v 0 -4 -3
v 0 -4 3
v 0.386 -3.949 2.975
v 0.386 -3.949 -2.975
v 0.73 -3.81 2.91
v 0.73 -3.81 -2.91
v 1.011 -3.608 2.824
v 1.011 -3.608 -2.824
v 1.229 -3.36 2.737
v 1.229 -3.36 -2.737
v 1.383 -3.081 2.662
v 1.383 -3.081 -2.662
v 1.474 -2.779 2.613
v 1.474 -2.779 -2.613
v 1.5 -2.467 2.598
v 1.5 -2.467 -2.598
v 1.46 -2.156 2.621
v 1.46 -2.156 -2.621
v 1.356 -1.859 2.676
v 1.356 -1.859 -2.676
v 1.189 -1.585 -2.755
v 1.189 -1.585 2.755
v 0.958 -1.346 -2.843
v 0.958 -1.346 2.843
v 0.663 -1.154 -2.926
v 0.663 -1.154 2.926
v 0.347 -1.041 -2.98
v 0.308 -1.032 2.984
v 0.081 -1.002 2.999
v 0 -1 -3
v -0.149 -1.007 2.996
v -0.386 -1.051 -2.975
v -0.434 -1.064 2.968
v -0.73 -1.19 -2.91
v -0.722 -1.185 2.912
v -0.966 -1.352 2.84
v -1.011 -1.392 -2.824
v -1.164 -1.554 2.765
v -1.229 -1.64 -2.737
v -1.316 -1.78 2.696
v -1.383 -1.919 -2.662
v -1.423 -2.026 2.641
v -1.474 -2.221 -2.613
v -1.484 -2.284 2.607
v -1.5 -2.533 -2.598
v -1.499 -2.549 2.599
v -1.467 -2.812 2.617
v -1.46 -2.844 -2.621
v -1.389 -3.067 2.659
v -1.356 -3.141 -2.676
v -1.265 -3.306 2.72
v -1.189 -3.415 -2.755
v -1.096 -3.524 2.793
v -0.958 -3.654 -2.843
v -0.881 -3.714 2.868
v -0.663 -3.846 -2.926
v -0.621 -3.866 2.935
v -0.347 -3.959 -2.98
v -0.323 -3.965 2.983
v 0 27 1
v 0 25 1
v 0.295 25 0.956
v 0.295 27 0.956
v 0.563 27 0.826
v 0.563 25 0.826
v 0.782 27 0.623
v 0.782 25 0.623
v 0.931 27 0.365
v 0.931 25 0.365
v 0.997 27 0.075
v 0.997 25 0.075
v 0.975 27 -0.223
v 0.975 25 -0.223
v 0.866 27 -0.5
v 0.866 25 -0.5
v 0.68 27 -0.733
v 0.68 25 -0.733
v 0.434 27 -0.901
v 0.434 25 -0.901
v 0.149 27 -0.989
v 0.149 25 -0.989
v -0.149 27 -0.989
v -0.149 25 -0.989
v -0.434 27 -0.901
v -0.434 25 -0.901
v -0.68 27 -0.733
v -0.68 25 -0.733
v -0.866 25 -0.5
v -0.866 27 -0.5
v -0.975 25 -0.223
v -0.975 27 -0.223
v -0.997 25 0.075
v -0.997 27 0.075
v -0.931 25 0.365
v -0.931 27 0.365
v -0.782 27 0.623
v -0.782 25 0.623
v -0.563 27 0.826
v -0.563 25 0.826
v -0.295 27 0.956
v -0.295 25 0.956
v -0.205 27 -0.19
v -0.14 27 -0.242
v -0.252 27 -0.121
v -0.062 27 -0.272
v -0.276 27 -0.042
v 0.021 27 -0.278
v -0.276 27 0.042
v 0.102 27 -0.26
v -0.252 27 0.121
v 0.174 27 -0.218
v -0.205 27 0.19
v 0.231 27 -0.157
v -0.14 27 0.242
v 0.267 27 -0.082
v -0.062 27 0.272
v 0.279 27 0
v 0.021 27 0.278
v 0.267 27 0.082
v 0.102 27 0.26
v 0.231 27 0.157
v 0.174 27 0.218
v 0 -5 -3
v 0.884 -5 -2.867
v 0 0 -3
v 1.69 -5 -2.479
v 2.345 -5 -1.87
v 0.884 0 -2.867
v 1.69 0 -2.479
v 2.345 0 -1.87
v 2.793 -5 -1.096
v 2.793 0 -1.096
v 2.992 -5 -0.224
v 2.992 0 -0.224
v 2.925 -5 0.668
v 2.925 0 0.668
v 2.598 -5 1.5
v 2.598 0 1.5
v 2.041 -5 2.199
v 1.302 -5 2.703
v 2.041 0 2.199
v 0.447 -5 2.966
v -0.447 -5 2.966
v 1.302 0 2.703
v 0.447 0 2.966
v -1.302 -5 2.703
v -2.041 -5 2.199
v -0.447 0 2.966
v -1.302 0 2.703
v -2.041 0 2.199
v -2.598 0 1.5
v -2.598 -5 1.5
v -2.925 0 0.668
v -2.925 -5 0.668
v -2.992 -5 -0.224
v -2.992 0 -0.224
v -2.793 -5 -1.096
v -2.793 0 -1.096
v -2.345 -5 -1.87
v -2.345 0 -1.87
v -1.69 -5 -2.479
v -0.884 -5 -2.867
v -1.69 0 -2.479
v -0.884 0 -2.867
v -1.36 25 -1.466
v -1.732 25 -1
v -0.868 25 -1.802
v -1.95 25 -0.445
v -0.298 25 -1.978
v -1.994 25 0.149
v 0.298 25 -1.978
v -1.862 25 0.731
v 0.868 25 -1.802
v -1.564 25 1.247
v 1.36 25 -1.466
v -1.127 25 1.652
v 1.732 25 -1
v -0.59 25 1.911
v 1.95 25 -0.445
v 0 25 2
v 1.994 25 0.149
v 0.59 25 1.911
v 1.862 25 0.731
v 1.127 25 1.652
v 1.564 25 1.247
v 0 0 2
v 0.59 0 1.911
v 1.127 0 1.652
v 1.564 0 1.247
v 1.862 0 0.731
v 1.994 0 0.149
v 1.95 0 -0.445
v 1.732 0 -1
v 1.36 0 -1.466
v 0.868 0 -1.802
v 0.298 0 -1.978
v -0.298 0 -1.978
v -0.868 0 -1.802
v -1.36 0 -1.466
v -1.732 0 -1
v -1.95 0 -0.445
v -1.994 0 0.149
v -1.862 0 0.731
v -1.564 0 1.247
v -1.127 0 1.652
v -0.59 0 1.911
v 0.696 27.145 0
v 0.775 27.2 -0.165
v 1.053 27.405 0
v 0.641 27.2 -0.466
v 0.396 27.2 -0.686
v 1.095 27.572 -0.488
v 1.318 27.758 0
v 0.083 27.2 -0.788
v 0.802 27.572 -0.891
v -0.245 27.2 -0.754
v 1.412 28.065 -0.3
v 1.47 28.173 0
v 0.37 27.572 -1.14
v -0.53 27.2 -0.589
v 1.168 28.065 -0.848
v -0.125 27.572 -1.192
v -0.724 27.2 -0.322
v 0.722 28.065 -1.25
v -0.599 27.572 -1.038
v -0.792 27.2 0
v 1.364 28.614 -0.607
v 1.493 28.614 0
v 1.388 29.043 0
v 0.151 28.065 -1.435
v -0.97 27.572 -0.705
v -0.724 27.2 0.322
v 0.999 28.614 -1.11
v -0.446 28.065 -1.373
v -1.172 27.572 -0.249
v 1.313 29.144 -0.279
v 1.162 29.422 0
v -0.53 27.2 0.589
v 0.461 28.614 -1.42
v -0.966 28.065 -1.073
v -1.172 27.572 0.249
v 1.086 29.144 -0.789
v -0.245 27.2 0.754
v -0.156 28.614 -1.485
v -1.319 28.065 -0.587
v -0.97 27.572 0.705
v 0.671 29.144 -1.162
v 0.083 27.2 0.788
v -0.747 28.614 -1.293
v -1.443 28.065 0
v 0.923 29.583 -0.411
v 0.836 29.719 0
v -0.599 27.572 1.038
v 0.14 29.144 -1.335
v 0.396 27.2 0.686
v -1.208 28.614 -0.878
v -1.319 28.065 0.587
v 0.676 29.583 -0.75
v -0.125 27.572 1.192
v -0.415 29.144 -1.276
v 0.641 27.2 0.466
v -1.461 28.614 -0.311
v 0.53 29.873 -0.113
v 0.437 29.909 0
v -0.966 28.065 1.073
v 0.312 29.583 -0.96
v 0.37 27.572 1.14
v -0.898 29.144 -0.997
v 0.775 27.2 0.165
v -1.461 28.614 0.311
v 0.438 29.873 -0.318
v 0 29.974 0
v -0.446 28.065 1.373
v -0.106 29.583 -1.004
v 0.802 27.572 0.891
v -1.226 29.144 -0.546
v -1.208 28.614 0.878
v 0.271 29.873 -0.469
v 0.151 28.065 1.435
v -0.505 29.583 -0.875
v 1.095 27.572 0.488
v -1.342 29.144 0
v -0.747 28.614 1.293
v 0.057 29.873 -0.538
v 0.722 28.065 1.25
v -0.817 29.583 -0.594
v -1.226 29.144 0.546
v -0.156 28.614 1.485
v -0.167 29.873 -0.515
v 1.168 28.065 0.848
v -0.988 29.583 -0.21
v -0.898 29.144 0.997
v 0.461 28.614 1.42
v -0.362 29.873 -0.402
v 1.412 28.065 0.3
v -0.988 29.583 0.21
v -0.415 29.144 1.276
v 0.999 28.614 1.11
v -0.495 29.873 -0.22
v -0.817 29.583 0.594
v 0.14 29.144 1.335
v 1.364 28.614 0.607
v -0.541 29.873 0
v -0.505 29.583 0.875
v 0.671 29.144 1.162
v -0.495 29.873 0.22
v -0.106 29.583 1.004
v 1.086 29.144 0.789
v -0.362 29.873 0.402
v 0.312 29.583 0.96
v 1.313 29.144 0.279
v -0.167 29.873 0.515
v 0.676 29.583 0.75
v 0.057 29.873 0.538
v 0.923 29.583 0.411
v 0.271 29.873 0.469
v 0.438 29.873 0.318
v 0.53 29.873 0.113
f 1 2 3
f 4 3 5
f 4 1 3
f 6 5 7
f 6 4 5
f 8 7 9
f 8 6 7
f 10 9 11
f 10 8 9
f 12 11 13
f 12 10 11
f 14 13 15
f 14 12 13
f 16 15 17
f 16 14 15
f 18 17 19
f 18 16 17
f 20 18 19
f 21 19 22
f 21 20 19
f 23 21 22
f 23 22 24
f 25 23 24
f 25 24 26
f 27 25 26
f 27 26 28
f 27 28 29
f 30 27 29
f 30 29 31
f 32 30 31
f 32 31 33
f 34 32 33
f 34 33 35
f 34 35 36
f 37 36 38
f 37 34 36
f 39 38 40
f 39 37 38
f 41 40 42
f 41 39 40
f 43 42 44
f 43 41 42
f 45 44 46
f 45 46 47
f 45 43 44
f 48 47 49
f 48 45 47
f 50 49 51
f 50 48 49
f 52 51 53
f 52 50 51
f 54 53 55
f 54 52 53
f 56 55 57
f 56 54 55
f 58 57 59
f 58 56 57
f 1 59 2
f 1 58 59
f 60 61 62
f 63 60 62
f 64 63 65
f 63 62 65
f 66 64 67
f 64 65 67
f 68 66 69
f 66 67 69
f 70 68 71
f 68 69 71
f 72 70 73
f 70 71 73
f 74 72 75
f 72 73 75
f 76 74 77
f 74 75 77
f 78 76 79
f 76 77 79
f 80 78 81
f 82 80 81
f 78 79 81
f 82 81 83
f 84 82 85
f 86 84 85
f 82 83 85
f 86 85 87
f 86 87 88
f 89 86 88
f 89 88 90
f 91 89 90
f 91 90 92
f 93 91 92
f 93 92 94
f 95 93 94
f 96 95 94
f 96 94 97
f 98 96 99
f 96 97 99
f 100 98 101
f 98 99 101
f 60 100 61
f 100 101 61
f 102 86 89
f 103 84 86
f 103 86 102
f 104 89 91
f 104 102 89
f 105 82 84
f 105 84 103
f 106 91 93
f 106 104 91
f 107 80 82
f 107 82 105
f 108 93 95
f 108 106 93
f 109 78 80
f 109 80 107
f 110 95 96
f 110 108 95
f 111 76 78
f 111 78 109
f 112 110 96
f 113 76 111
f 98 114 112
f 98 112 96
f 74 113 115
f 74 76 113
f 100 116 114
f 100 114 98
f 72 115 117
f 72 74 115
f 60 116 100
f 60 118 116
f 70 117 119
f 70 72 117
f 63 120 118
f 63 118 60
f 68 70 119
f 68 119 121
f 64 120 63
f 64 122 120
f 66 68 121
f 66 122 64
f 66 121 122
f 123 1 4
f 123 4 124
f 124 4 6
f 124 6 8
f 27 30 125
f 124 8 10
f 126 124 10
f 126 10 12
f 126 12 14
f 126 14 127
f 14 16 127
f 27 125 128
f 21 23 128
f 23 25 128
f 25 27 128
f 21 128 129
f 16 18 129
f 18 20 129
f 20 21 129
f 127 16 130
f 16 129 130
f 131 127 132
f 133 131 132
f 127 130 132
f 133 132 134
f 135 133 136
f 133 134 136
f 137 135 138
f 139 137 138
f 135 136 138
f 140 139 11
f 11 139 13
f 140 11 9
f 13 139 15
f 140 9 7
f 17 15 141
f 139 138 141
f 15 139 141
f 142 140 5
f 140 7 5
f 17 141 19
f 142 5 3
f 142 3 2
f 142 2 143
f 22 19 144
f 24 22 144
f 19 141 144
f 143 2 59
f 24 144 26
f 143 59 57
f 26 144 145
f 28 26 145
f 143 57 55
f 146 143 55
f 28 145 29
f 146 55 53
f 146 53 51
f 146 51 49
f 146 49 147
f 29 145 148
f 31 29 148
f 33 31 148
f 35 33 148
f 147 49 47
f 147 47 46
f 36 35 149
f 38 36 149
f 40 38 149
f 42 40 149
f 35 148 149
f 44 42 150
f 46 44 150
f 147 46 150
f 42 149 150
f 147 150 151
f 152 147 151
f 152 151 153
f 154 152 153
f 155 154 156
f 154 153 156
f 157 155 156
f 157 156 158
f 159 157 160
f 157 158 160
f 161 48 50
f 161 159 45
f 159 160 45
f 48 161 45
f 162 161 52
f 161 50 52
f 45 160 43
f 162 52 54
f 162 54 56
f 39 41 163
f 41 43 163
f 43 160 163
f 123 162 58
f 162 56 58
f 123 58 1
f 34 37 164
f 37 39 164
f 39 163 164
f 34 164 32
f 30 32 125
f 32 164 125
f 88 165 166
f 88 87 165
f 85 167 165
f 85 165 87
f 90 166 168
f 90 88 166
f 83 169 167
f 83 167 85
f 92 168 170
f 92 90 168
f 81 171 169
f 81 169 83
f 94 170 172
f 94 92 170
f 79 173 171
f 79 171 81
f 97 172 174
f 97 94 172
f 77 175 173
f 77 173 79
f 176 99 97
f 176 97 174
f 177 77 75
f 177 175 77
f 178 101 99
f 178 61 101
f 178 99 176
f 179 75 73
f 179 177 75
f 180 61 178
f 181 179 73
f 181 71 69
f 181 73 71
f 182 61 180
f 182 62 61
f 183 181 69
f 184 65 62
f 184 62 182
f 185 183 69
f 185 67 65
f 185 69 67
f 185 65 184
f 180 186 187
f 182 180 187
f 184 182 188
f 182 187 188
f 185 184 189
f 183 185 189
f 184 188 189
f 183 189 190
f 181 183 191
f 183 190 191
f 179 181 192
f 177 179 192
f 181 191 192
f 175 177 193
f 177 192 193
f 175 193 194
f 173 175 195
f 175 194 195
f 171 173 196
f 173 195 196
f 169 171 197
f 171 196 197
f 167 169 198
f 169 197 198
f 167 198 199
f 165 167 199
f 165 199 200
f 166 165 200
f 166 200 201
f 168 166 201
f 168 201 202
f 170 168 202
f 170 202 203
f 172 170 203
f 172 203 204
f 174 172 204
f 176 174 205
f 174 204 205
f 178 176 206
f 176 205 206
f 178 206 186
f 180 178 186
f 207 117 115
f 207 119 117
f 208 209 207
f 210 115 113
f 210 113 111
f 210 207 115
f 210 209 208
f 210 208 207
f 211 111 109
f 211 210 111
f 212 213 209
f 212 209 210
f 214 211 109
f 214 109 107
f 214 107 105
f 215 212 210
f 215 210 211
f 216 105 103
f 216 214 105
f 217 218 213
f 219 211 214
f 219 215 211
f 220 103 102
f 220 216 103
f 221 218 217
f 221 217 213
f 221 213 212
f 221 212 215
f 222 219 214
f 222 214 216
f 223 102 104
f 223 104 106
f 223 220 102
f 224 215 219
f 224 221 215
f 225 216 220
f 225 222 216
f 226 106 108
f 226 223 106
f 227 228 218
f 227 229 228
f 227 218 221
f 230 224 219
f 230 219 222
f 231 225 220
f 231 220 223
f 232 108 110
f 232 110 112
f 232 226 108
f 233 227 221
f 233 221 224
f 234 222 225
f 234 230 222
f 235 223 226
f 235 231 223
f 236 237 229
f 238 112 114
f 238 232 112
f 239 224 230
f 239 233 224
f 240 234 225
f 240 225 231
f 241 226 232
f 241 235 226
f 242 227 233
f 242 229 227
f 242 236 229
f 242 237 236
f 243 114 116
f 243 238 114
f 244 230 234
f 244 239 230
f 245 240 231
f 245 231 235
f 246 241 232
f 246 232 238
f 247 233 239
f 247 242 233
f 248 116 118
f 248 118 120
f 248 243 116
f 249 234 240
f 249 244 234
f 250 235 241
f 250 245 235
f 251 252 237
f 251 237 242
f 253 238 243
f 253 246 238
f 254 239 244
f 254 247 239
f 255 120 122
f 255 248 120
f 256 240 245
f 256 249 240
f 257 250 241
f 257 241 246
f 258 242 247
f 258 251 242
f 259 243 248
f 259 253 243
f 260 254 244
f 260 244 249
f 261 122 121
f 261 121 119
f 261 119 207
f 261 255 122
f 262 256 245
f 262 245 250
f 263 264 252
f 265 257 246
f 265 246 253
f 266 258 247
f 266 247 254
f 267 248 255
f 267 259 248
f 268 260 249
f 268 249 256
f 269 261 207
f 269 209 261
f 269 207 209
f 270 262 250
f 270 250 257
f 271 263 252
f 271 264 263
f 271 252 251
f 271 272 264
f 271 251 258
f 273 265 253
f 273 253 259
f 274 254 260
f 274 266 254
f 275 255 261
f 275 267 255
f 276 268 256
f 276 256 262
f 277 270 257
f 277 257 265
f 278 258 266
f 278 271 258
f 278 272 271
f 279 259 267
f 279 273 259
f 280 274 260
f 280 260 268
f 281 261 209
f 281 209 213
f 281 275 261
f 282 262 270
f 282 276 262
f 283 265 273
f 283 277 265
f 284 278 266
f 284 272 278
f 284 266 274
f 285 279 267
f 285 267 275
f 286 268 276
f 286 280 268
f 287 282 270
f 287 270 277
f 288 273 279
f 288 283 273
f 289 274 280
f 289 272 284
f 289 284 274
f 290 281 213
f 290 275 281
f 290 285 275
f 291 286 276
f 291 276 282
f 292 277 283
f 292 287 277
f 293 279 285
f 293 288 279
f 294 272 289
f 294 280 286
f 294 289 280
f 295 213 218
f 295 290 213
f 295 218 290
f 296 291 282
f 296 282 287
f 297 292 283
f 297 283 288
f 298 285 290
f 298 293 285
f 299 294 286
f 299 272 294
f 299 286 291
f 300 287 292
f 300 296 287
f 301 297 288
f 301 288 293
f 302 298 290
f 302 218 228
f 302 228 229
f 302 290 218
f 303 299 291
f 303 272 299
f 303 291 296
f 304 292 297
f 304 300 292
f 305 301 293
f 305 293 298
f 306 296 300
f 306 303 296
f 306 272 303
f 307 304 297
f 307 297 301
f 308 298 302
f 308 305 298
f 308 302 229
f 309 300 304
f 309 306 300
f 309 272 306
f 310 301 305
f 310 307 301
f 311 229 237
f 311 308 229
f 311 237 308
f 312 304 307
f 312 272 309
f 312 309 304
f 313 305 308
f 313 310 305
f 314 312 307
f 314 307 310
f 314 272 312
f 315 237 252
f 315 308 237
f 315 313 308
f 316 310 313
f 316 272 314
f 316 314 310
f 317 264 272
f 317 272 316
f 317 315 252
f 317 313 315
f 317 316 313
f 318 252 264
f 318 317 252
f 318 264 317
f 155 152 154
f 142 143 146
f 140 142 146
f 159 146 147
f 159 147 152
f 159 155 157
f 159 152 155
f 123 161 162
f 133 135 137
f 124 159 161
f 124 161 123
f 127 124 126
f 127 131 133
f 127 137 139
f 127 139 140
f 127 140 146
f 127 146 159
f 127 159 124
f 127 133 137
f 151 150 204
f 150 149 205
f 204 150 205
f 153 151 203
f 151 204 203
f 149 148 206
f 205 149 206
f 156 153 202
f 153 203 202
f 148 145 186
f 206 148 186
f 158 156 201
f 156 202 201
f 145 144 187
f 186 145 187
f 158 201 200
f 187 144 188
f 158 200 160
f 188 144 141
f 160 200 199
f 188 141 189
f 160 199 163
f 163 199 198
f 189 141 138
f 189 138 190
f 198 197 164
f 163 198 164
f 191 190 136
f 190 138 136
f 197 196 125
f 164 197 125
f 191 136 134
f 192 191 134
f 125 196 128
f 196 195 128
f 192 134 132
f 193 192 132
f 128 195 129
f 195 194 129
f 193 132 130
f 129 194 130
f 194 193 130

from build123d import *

# Parameters (mm, degrees)
SZKIC1_R                        = 2
DODANIE_WYCI_GNI_CIE1_DEPTH     = 25
SZKIC2_R                        = 1
DODANIE_WYCI_GNI_CIE2_DEPTH     = 2
SZKIC4_R                        = 3
DODANIE_WYCI_GNI_CIE3_DEPTH     = 5
WYTNIJ_WYCI_GNI_CIE1_DEPTH      = 31.272564199
WYTNIJ_WYCI_GNI_CIE1_DEPTH_BACK = 31.272564199
SZKIC5_R                        = 1.5


with BuildPart() as part:
    # Szkic1 → Dodanie-wyciągnięcie1 (new body)
    with BuildSketch(Plane(origin=(0, 0, 0), x_dir=(1, 0, 0), z_dir=(0, 1, 0))):
        with Locations(Location((0, 0, 0), (0, 0, 270))):
            Circle(SZKIC1_R)
    extrude(amount=DODANIE_WYCI_GNI_CIE1_DEPTH)

    # Szkic2 → Dodanie-wyciągnięcie2 (add)
    with BuildSketch(Plane(origin=(0, 25, 0), x_dir=(1, 0, 0), z_dir=(0, 1, 0))):
        with Locations(Location((0, 0, 0), (0, 0, 270))):
            Circle(SZKIC2_R)
    extrude(amount=DODANIE_WYCI_GNI_CIE2_DEPTH)

    # Szkic3 → Obrót3 (revolve)
    with BuildSketch(Plane.XY):
        with BuildLine():
            Line((0, 29.973790938), (0, 26.973790938))
            ThreePointArc((0, 26.973790938), (1.5, 28.473790938), (0, 29.973790938))
        make_face()
    revolve(axis=Axis((0, 0, 0), (0, 1, 0)))

    # Szkic4 → Dodanie-wyciągnięcie3 (add)
    with BuildSketch(Plane.XZ):
        with Locations(Location((0, 0, 0), (0, 0, 270))):
            Circle(SZKIC4_R)
    extrude(amount=DODANIE_WYCI_GNI_CIE3_DEPTH)

    # Szkic5 → Wytnij-wyciągnięcie1 (cut, two sides: drawn at the far end of the back side and taken through both)
    with BuildSketch(Plane.XY.offset(-WYTNIJ_WYCI_GNI_CIE1_DEPTH_BACK)):
        with Locations(Location((0, -2.5, 0), (0, 0, 270.000000001))):
            Circle(SZKIC5_R)
    extrude(amount=WYTNIJ_WYCI_GNI_CIE1_DEPTH + WYTNIJ_WYCI_GNI_CIE1_DEPTH_BACK, mode=Mode.SUBTRACT)


solid = part.part
